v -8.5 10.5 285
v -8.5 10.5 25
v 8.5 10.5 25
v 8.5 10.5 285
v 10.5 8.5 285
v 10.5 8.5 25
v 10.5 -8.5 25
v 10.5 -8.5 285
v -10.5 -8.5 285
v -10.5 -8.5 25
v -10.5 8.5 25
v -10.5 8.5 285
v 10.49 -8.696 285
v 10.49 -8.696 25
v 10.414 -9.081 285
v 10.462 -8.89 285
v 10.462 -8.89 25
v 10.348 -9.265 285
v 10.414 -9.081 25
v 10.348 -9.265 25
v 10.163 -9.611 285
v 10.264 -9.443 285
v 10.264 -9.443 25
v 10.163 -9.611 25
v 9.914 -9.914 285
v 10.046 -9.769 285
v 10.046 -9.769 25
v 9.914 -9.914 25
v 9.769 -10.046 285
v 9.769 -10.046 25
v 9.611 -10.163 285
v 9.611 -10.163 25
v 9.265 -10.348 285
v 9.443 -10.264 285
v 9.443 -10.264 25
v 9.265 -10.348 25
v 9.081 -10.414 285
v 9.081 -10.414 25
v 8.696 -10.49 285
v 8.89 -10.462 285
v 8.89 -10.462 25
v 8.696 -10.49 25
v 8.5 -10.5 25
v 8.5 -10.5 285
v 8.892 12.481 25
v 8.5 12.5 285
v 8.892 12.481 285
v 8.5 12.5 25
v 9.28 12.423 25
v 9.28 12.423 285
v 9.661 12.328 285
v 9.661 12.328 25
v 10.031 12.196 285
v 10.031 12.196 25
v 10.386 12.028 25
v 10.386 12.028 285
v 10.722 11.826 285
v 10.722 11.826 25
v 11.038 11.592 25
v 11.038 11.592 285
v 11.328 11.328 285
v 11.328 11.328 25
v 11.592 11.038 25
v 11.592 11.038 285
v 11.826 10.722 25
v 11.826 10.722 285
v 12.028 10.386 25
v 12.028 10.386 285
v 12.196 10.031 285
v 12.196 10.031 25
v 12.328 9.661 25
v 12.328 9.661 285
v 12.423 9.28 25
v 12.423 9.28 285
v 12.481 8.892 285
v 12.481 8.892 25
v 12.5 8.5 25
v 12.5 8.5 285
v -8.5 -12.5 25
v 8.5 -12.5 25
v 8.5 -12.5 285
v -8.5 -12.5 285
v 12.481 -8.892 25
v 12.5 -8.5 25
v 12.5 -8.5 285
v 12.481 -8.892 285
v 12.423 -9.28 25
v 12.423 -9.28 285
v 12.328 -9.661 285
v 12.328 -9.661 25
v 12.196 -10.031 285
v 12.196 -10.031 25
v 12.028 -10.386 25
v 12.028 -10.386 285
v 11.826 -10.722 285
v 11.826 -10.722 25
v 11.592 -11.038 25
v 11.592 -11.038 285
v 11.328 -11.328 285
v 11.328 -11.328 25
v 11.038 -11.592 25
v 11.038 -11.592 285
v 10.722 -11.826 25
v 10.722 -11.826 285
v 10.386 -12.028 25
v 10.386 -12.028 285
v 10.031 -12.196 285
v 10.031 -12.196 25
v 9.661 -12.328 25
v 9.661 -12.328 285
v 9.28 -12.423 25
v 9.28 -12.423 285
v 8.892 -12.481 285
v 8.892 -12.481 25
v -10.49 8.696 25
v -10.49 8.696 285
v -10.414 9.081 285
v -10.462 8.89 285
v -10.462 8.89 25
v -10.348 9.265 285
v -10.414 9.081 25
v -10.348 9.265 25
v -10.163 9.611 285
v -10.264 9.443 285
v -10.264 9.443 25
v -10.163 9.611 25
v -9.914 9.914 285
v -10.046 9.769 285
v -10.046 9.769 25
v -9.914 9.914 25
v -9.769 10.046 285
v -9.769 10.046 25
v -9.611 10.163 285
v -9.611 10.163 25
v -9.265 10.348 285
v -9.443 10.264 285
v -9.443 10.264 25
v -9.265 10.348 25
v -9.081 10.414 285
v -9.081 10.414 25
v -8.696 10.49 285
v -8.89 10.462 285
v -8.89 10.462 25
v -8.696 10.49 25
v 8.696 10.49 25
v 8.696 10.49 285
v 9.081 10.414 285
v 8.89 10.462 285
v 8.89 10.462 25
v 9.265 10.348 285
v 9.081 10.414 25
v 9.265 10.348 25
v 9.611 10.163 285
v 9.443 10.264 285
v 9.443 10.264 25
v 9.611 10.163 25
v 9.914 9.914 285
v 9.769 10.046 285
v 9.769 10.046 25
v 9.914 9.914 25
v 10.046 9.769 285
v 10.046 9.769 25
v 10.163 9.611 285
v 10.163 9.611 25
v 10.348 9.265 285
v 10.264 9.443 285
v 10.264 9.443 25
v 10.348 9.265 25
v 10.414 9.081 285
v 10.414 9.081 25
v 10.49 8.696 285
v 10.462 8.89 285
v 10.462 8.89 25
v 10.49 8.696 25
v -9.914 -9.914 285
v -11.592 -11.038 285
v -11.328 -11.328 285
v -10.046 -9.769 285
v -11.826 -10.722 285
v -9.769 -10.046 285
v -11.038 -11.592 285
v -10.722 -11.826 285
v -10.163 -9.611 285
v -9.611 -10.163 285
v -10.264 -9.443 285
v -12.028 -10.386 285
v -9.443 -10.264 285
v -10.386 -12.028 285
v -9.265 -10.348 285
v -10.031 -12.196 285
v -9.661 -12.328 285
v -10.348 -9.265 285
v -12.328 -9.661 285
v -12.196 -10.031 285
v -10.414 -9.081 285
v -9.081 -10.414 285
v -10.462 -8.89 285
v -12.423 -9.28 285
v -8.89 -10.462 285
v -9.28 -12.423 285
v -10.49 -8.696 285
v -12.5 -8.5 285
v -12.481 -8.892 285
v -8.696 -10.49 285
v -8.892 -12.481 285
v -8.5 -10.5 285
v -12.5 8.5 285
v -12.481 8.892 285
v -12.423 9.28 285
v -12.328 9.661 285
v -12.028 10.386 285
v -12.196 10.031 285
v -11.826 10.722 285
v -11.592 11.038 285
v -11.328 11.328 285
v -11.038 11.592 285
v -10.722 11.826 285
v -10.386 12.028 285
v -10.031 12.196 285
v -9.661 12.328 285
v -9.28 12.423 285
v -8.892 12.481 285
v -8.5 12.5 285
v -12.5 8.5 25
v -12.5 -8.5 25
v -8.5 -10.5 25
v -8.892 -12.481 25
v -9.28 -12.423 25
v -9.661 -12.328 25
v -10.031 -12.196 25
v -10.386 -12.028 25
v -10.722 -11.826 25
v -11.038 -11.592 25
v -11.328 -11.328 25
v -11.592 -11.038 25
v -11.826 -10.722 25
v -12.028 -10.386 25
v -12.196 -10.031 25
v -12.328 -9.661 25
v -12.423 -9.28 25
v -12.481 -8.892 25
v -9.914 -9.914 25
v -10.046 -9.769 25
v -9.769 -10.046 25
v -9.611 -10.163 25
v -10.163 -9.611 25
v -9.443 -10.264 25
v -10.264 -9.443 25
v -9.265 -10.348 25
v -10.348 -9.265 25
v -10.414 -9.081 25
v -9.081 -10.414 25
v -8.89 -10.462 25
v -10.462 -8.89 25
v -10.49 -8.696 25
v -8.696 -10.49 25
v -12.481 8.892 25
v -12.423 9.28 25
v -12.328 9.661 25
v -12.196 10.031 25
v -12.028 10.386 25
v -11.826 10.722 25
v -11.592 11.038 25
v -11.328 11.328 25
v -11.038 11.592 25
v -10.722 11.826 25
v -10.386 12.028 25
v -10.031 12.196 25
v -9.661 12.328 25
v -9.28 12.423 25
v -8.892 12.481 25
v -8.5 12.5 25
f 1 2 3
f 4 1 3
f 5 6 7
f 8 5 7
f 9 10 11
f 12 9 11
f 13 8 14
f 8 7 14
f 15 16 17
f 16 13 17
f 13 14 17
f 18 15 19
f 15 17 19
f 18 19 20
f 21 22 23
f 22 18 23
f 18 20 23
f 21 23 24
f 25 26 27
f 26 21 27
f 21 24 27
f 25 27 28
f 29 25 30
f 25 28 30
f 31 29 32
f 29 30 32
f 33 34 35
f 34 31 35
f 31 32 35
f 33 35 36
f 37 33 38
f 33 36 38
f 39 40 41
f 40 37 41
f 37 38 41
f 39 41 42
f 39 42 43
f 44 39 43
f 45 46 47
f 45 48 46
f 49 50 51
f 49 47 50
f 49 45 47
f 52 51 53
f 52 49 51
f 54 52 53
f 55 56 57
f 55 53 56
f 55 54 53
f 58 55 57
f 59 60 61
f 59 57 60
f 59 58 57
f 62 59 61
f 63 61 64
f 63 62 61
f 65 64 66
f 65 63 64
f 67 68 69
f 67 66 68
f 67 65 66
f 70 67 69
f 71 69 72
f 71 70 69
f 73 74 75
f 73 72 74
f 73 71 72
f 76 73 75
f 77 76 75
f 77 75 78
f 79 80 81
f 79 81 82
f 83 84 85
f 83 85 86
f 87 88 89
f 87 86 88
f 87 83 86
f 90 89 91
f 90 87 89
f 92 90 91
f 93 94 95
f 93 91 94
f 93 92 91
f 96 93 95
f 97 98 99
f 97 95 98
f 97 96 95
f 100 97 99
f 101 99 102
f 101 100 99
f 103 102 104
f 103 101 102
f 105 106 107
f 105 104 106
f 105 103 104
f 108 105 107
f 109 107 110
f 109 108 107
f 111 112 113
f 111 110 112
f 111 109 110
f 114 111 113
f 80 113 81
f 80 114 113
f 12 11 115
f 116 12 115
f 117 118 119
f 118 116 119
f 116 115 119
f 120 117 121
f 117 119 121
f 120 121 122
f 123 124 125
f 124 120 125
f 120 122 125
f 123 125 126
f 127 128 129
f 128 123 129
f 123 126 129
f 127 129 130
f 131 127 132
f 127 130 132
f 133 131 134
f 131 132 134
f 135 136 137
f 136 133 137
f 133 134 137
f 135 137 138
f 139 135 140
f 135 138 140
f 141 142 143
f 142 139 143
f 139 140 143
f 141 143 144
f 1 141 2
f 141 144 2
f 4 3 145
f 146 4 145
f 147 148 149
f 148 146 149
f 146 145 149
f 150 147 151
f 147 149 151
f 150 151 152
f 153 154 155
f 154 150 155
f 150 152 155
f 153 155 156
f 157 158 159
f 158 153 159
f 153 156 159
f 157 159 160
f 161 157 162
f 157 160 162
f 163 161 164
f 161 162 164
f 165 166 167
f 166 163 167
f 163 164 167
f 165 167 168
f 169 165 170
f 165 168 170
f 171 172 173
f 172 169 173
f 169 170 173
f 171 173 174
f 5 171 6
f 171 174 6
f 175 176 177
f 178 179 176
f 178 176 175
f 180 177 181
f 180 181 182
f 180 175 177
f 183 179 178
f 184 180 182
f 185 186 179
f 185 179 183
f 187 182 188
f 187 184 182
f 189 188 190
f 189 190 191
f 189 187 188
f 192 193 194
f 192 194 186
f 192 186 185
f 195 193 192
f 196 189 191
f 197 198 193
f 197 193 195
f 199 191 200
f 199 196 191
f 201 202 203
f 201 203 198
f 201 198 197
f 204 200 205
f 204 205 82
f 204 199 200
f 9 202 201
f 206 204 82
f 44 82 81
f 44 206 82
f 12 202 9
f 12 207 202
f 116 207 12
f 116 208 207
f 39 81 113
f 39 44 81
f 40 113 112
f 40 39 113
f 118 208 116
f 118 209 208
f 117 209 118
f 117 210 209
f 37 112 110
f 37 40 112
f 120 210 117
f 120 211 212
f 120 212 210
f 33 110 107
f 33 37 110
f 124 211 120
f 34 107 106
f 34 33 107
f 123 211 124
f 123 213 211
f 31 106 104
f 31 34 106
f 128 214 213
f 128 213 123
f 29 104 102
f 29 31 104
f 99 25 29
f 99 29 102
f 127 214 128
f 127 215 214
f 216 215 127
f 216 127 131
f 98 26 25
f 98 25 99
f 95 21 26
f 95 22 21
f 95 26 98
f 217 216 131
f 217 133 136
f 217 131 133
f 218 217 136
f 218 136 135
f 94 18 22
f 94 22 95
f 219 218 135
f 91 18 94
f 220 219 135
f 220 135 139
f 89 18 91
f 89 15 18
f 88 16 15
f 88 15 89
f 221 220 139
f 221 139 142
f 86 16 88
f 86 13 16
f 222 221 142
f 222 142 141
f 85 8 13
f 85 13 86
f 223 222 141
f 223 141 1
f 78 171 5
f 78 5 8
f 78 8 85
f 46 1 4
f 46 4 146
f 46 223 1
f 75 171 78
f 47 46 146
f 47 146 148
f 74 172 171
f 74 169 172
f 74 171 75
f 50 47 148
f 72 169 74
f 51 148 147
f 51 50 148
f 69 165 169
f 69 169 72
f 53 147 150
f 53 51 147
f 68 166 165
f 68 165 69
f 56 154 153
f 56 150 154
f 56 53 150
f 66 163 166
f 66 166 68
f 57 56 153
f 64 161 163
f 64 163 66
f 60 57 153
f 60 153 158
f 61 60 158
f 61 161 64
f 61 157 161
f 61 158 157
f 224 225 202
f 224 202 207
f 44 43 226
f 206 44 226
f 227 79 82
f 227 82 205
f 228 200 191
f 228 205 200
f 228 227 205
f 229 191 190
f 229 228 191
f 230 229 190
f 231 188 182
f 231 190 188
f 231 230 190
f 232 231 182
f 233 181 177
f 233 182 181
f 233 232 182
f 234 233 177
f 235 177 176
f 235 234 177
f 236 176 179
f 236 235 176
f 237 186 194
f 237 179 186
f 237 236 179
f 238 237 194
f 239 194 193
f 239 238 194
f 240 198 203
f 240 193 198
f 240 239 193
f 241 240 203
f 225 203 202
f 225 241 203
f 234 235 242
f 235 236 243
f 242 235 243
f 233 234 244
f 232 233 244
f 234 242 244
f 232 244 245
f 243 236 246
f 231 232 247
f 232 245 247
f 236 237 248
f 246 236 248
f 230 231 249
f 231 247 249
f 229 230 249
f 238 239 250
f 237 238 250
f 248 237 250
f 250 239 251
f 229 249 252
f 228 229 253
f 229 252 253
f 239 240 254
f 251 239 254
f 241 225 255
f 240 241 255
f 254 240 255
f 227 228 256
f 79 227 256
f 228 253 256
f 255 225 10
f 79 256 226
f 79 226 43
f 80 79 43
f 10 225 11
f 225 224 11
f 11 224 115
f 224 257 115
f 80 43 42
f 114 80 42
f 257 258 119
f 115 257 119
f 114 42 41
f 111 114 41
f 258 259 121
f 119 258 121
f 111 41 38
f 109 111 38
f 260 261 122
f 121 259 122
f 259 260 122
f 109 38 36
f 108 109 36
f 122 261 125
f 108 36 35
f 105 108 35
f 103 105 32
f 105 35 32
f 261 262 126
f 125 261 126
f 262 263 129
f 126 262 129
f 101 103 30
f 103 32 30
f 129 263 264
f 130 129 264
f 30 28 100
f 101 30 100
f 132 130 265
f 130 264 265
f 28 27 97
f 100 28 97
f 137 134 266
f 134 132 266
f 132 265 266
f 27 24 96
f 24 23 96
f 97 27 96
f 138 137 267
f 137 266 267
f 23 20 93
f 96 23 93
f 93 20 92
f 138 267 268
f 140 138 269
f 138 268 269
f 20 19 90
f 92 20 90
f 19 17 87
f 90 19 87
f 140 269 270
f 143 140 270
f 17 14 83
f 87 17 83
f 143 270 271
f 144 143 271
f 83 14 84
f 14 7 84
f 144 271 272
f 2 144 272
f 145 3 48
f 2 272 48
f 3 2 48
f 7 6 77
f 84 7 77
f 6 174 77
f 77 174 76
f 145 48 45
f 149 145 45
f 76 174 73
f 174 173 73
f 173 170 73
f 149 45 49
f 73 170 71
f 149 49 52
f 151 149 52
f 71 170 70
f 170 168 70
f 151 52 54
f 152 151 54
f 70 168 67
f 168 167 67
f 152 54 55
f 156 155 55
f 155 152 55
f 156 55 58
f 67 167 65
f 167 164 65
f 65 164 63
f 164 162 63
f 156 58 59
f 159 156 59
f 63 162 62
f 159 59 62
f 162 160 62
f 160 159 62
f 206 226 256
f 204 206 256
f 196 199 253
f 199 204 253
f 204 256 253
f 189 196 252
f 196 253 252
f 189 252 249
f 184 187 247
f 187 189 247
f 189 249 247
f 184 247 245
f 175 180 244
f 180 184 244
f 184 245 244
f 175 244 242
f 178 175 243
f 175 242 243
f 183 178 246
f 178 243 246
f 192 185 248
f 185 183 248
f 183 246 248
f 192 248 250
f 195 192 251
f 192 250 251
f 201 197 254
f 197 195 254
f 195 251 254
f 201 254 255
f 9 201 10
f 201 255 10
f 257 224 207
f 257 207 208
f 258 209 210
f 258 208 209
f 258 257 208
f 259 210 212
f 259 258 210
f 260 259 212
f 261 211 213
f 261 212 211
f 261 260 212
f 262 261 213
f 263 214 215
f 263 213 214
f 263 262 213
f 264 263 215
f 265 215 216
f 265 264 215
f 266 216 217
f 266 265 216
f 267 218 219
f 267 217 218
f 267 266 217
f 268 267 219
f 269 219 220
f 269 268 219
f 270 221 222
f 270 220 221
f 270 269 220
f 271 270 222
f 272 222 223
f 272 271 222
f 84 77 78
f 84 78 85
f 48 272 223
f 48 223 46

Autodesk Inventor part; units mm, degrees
ref_plane "Start plane" through (0, 0, 25) normal (0, 0, 1) x (1, 0, 0)
ref_plane "End plane" through (0, 0, 285) normal (0, 0, 1) x (1, 0, 0)
sketch "Sketch" plane through (0, 0, 0) normal (0, 0, 1) x (1, 0, 0)
  line L0 (-12.5, -8.5) -> (-12.5, 8.5)
  line L1 (-8.5, 12.5) -> (8.5, 12.5)
  line L2 (12.5, 8.5) -> (12.5, -8.5)
  line L3 (8.5, -12.5) -> (-8.5, -12.5)
  arc A0 (-12.5, -8.5) -> (-8.5, -12.5) centre (-8.5, -8.5) ccw
  arc A1 (12.5, 8.5) -> (8.5, 12.5) centre (8.5, 8.5) ccw
  arc A2 (-8.5, 12.5) -> (-12.5, 8.5) centre (-8.5, 8.5) ccw
  arc A3 (8.5, -12.5) -> (12.5, -8.5) centre (8.5, -8.5) ccw
  arc A4 (-8.5, 10.5) -> (-10.5, 8.5) centre (-8.5, 8.5) ccw
  line L4 (-8.5, 10.5) -> (8.5, 10.5)
  arc A5 (10.5, 8.5) -> (8.5, 10.5) centre (8.5, 8.5) ccw
  line L5 (10.5, 8.5) -> (10.5, -8.5)
  arc A6 (8.5, -10.5) -> (10.5, -8.5) centre (8.5, -8.5) ccw
  line L6 (8.5, -10.5) -> (-8.5, -10.5)
  arc A7 (-10.5, -8.5) -> (-8.5, -10.5) centre (-8.5, -8.5) ccw
  line L7 (-10.5, -8.5) -> (-10.5, 8.5)
  line L8 (0, 18.6598) -> (0, -18.6598) construction
  line L9 (-18.6598, 0) -> (18.6598, 0) construction
  dimension "d7" = 4
  dimension "d9" = 25
  dimension "d11" = 25
  dimension "d12" = 2
  dimension "d15" = 12.5
  dimension "d16" = 12.5
extrude "Body" add sketch "Sketch" along normal up to surface (260 mm away) from surface at 25
sketch "Sketch3" plane through (0, 0, 0) normal (0, 0, 1) x (1, 0, 0)
  line L0 (0, 0) -> (10, 0)
ref_plane "Work Plane3" through (0, 0, 0) normal (0, -1, 0) x (1, 0, 0)
sketch "Sketch4" plane through (0, 0, 0) normal (0, -1, 0) x (1, 0, 0)
  line L0 (-2, 25) -> (12, 25)
  line L1 (-2, 285) -> (12, 285)
  dimension "d18" = 260
ref_plane "Work Plane4" through (-8.5, 27.5, 25) normal (0, 0, -1) x (-1, 0, 0)
split "Split1" plane through (-8.5, 27.5, 25) removes the side toward (0, 0, -1)
ref_plane "Work Plane5" through (8.5, 27.5, 285) normal (0, 0, 1) x (1, 0, 0)
split "Split2" plane through (8.5, 27.5, 285) removes the side toward (0, 0, 1)
equation "\"d7\" = G_IR"
equation "\"d9\" = G_W"
equation "\"d11\" = G_H"
equation "\"d12\" = G_T"
equation "\"d15\" = 0.5 * d9"
equation "\"d16\" = 0.5 * d11"
equation "\"d3\" = G_L"
equation "\"G_W\" = 25"
equation "\"G_H\" = 25"
equation "\"G_T\" = 2"
equation "\"G_IR\" = 4"
equation "\"G_L\" = d18"
equation "\"G_OFFSET_START\" = -25"
equation "\"G_OFFSET_END\" = -25"
equation "\"d13\" = -G_OFFSET_START"
equation "\"d14\" = G_OFFSET_END + B_L"
equation "\"B_L\" = 310"
properties part number "ISO 4019 - 25x25x2 - 260" material "Steel, Mild"
